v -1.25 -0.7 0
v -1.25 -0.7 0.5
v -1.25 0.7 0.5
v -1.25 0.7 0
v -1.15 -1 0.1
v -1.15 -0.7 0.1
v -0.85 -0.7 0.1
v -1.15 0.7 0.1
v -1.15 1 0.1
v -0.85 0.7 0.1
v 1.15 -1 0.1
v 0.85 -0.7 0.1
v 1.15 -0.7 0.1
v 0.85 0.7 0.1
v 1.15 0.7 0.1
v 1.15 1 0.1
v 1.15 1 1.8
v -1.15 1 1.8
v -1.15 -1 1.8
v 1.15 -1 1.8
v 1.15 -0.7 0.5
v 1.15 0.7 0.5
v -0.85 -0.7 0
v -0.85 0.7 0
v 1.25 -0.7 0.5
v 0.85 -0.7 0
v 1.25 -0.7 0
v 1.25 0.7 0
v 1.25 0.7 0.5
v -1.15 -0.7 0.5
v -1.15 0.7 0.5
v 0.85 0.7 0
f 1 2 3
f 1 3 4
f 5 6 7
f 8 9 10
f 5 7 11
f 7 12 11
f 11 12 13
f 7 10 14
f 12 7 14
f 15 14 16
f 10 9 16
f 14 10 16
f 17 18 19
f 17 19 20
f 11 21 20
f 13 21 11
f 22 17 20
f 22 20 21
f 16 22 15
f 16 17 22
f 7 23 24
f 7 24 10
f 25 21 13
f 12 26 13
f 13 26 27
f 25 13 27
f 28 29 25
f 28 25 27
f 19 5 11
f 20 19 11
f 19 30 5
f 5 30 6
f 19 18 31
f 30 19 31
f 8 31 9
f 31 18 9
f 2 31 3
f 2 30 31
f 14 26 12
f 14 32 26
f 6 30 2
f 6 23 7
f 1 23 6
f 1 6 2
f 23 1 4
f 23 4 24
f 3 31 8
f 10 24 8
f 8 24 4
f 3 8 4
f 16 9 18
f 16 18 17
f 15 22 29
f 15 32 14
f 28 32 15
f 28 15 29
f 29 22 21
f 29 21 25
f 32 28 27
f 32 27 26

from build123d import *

# Parameters (mm, degrees)
SKETCH1_W           = 2.3
SKETCH1_H           = 1.7
BOSS_EXTRUDE1_DEPTH = 1
BOSS_EXTRUDE2_DEPTH = 0.7


with BuildPart() as part:
    # Sketch1 → Boss-Extrude1 (new, symmetric)
    with BuildSketch(Plane(origin=(0, 0, 0), x_dir=(1, 0, 0), z_dir=(0, 1, 0))):
        with Locations((0, -0.95)):
            Rectangle(SKETCH1_W, SKETCH1_H)
    extrude(amount=BOSS_EXTRUDE1_DEPTH, both=True)

    # Sketch2 → Boss-Extrude2 (add, symmetric)
    with BuildSketch(Plane(origin=(0, 0, 0), x_dir=(1, 0, 0), z_dir=(0, 1, 0))):
        Polygon((-1.15, -0.5), (-1.25, -0.5), (-1.25, 0), (-0.85, 0), (-0.85, -0.1), (-1.15, -0.1), align=None)
        Polygon((1.15, -0.1), (1.15, -0.5), (1.25, -0.5), (1.25, 0), (0.85, 0), (0.85, -0.1), align=None)
    extrude(amount=BOSS_EXTRUDE2_DEPTH, both=True)


solid = part.part
